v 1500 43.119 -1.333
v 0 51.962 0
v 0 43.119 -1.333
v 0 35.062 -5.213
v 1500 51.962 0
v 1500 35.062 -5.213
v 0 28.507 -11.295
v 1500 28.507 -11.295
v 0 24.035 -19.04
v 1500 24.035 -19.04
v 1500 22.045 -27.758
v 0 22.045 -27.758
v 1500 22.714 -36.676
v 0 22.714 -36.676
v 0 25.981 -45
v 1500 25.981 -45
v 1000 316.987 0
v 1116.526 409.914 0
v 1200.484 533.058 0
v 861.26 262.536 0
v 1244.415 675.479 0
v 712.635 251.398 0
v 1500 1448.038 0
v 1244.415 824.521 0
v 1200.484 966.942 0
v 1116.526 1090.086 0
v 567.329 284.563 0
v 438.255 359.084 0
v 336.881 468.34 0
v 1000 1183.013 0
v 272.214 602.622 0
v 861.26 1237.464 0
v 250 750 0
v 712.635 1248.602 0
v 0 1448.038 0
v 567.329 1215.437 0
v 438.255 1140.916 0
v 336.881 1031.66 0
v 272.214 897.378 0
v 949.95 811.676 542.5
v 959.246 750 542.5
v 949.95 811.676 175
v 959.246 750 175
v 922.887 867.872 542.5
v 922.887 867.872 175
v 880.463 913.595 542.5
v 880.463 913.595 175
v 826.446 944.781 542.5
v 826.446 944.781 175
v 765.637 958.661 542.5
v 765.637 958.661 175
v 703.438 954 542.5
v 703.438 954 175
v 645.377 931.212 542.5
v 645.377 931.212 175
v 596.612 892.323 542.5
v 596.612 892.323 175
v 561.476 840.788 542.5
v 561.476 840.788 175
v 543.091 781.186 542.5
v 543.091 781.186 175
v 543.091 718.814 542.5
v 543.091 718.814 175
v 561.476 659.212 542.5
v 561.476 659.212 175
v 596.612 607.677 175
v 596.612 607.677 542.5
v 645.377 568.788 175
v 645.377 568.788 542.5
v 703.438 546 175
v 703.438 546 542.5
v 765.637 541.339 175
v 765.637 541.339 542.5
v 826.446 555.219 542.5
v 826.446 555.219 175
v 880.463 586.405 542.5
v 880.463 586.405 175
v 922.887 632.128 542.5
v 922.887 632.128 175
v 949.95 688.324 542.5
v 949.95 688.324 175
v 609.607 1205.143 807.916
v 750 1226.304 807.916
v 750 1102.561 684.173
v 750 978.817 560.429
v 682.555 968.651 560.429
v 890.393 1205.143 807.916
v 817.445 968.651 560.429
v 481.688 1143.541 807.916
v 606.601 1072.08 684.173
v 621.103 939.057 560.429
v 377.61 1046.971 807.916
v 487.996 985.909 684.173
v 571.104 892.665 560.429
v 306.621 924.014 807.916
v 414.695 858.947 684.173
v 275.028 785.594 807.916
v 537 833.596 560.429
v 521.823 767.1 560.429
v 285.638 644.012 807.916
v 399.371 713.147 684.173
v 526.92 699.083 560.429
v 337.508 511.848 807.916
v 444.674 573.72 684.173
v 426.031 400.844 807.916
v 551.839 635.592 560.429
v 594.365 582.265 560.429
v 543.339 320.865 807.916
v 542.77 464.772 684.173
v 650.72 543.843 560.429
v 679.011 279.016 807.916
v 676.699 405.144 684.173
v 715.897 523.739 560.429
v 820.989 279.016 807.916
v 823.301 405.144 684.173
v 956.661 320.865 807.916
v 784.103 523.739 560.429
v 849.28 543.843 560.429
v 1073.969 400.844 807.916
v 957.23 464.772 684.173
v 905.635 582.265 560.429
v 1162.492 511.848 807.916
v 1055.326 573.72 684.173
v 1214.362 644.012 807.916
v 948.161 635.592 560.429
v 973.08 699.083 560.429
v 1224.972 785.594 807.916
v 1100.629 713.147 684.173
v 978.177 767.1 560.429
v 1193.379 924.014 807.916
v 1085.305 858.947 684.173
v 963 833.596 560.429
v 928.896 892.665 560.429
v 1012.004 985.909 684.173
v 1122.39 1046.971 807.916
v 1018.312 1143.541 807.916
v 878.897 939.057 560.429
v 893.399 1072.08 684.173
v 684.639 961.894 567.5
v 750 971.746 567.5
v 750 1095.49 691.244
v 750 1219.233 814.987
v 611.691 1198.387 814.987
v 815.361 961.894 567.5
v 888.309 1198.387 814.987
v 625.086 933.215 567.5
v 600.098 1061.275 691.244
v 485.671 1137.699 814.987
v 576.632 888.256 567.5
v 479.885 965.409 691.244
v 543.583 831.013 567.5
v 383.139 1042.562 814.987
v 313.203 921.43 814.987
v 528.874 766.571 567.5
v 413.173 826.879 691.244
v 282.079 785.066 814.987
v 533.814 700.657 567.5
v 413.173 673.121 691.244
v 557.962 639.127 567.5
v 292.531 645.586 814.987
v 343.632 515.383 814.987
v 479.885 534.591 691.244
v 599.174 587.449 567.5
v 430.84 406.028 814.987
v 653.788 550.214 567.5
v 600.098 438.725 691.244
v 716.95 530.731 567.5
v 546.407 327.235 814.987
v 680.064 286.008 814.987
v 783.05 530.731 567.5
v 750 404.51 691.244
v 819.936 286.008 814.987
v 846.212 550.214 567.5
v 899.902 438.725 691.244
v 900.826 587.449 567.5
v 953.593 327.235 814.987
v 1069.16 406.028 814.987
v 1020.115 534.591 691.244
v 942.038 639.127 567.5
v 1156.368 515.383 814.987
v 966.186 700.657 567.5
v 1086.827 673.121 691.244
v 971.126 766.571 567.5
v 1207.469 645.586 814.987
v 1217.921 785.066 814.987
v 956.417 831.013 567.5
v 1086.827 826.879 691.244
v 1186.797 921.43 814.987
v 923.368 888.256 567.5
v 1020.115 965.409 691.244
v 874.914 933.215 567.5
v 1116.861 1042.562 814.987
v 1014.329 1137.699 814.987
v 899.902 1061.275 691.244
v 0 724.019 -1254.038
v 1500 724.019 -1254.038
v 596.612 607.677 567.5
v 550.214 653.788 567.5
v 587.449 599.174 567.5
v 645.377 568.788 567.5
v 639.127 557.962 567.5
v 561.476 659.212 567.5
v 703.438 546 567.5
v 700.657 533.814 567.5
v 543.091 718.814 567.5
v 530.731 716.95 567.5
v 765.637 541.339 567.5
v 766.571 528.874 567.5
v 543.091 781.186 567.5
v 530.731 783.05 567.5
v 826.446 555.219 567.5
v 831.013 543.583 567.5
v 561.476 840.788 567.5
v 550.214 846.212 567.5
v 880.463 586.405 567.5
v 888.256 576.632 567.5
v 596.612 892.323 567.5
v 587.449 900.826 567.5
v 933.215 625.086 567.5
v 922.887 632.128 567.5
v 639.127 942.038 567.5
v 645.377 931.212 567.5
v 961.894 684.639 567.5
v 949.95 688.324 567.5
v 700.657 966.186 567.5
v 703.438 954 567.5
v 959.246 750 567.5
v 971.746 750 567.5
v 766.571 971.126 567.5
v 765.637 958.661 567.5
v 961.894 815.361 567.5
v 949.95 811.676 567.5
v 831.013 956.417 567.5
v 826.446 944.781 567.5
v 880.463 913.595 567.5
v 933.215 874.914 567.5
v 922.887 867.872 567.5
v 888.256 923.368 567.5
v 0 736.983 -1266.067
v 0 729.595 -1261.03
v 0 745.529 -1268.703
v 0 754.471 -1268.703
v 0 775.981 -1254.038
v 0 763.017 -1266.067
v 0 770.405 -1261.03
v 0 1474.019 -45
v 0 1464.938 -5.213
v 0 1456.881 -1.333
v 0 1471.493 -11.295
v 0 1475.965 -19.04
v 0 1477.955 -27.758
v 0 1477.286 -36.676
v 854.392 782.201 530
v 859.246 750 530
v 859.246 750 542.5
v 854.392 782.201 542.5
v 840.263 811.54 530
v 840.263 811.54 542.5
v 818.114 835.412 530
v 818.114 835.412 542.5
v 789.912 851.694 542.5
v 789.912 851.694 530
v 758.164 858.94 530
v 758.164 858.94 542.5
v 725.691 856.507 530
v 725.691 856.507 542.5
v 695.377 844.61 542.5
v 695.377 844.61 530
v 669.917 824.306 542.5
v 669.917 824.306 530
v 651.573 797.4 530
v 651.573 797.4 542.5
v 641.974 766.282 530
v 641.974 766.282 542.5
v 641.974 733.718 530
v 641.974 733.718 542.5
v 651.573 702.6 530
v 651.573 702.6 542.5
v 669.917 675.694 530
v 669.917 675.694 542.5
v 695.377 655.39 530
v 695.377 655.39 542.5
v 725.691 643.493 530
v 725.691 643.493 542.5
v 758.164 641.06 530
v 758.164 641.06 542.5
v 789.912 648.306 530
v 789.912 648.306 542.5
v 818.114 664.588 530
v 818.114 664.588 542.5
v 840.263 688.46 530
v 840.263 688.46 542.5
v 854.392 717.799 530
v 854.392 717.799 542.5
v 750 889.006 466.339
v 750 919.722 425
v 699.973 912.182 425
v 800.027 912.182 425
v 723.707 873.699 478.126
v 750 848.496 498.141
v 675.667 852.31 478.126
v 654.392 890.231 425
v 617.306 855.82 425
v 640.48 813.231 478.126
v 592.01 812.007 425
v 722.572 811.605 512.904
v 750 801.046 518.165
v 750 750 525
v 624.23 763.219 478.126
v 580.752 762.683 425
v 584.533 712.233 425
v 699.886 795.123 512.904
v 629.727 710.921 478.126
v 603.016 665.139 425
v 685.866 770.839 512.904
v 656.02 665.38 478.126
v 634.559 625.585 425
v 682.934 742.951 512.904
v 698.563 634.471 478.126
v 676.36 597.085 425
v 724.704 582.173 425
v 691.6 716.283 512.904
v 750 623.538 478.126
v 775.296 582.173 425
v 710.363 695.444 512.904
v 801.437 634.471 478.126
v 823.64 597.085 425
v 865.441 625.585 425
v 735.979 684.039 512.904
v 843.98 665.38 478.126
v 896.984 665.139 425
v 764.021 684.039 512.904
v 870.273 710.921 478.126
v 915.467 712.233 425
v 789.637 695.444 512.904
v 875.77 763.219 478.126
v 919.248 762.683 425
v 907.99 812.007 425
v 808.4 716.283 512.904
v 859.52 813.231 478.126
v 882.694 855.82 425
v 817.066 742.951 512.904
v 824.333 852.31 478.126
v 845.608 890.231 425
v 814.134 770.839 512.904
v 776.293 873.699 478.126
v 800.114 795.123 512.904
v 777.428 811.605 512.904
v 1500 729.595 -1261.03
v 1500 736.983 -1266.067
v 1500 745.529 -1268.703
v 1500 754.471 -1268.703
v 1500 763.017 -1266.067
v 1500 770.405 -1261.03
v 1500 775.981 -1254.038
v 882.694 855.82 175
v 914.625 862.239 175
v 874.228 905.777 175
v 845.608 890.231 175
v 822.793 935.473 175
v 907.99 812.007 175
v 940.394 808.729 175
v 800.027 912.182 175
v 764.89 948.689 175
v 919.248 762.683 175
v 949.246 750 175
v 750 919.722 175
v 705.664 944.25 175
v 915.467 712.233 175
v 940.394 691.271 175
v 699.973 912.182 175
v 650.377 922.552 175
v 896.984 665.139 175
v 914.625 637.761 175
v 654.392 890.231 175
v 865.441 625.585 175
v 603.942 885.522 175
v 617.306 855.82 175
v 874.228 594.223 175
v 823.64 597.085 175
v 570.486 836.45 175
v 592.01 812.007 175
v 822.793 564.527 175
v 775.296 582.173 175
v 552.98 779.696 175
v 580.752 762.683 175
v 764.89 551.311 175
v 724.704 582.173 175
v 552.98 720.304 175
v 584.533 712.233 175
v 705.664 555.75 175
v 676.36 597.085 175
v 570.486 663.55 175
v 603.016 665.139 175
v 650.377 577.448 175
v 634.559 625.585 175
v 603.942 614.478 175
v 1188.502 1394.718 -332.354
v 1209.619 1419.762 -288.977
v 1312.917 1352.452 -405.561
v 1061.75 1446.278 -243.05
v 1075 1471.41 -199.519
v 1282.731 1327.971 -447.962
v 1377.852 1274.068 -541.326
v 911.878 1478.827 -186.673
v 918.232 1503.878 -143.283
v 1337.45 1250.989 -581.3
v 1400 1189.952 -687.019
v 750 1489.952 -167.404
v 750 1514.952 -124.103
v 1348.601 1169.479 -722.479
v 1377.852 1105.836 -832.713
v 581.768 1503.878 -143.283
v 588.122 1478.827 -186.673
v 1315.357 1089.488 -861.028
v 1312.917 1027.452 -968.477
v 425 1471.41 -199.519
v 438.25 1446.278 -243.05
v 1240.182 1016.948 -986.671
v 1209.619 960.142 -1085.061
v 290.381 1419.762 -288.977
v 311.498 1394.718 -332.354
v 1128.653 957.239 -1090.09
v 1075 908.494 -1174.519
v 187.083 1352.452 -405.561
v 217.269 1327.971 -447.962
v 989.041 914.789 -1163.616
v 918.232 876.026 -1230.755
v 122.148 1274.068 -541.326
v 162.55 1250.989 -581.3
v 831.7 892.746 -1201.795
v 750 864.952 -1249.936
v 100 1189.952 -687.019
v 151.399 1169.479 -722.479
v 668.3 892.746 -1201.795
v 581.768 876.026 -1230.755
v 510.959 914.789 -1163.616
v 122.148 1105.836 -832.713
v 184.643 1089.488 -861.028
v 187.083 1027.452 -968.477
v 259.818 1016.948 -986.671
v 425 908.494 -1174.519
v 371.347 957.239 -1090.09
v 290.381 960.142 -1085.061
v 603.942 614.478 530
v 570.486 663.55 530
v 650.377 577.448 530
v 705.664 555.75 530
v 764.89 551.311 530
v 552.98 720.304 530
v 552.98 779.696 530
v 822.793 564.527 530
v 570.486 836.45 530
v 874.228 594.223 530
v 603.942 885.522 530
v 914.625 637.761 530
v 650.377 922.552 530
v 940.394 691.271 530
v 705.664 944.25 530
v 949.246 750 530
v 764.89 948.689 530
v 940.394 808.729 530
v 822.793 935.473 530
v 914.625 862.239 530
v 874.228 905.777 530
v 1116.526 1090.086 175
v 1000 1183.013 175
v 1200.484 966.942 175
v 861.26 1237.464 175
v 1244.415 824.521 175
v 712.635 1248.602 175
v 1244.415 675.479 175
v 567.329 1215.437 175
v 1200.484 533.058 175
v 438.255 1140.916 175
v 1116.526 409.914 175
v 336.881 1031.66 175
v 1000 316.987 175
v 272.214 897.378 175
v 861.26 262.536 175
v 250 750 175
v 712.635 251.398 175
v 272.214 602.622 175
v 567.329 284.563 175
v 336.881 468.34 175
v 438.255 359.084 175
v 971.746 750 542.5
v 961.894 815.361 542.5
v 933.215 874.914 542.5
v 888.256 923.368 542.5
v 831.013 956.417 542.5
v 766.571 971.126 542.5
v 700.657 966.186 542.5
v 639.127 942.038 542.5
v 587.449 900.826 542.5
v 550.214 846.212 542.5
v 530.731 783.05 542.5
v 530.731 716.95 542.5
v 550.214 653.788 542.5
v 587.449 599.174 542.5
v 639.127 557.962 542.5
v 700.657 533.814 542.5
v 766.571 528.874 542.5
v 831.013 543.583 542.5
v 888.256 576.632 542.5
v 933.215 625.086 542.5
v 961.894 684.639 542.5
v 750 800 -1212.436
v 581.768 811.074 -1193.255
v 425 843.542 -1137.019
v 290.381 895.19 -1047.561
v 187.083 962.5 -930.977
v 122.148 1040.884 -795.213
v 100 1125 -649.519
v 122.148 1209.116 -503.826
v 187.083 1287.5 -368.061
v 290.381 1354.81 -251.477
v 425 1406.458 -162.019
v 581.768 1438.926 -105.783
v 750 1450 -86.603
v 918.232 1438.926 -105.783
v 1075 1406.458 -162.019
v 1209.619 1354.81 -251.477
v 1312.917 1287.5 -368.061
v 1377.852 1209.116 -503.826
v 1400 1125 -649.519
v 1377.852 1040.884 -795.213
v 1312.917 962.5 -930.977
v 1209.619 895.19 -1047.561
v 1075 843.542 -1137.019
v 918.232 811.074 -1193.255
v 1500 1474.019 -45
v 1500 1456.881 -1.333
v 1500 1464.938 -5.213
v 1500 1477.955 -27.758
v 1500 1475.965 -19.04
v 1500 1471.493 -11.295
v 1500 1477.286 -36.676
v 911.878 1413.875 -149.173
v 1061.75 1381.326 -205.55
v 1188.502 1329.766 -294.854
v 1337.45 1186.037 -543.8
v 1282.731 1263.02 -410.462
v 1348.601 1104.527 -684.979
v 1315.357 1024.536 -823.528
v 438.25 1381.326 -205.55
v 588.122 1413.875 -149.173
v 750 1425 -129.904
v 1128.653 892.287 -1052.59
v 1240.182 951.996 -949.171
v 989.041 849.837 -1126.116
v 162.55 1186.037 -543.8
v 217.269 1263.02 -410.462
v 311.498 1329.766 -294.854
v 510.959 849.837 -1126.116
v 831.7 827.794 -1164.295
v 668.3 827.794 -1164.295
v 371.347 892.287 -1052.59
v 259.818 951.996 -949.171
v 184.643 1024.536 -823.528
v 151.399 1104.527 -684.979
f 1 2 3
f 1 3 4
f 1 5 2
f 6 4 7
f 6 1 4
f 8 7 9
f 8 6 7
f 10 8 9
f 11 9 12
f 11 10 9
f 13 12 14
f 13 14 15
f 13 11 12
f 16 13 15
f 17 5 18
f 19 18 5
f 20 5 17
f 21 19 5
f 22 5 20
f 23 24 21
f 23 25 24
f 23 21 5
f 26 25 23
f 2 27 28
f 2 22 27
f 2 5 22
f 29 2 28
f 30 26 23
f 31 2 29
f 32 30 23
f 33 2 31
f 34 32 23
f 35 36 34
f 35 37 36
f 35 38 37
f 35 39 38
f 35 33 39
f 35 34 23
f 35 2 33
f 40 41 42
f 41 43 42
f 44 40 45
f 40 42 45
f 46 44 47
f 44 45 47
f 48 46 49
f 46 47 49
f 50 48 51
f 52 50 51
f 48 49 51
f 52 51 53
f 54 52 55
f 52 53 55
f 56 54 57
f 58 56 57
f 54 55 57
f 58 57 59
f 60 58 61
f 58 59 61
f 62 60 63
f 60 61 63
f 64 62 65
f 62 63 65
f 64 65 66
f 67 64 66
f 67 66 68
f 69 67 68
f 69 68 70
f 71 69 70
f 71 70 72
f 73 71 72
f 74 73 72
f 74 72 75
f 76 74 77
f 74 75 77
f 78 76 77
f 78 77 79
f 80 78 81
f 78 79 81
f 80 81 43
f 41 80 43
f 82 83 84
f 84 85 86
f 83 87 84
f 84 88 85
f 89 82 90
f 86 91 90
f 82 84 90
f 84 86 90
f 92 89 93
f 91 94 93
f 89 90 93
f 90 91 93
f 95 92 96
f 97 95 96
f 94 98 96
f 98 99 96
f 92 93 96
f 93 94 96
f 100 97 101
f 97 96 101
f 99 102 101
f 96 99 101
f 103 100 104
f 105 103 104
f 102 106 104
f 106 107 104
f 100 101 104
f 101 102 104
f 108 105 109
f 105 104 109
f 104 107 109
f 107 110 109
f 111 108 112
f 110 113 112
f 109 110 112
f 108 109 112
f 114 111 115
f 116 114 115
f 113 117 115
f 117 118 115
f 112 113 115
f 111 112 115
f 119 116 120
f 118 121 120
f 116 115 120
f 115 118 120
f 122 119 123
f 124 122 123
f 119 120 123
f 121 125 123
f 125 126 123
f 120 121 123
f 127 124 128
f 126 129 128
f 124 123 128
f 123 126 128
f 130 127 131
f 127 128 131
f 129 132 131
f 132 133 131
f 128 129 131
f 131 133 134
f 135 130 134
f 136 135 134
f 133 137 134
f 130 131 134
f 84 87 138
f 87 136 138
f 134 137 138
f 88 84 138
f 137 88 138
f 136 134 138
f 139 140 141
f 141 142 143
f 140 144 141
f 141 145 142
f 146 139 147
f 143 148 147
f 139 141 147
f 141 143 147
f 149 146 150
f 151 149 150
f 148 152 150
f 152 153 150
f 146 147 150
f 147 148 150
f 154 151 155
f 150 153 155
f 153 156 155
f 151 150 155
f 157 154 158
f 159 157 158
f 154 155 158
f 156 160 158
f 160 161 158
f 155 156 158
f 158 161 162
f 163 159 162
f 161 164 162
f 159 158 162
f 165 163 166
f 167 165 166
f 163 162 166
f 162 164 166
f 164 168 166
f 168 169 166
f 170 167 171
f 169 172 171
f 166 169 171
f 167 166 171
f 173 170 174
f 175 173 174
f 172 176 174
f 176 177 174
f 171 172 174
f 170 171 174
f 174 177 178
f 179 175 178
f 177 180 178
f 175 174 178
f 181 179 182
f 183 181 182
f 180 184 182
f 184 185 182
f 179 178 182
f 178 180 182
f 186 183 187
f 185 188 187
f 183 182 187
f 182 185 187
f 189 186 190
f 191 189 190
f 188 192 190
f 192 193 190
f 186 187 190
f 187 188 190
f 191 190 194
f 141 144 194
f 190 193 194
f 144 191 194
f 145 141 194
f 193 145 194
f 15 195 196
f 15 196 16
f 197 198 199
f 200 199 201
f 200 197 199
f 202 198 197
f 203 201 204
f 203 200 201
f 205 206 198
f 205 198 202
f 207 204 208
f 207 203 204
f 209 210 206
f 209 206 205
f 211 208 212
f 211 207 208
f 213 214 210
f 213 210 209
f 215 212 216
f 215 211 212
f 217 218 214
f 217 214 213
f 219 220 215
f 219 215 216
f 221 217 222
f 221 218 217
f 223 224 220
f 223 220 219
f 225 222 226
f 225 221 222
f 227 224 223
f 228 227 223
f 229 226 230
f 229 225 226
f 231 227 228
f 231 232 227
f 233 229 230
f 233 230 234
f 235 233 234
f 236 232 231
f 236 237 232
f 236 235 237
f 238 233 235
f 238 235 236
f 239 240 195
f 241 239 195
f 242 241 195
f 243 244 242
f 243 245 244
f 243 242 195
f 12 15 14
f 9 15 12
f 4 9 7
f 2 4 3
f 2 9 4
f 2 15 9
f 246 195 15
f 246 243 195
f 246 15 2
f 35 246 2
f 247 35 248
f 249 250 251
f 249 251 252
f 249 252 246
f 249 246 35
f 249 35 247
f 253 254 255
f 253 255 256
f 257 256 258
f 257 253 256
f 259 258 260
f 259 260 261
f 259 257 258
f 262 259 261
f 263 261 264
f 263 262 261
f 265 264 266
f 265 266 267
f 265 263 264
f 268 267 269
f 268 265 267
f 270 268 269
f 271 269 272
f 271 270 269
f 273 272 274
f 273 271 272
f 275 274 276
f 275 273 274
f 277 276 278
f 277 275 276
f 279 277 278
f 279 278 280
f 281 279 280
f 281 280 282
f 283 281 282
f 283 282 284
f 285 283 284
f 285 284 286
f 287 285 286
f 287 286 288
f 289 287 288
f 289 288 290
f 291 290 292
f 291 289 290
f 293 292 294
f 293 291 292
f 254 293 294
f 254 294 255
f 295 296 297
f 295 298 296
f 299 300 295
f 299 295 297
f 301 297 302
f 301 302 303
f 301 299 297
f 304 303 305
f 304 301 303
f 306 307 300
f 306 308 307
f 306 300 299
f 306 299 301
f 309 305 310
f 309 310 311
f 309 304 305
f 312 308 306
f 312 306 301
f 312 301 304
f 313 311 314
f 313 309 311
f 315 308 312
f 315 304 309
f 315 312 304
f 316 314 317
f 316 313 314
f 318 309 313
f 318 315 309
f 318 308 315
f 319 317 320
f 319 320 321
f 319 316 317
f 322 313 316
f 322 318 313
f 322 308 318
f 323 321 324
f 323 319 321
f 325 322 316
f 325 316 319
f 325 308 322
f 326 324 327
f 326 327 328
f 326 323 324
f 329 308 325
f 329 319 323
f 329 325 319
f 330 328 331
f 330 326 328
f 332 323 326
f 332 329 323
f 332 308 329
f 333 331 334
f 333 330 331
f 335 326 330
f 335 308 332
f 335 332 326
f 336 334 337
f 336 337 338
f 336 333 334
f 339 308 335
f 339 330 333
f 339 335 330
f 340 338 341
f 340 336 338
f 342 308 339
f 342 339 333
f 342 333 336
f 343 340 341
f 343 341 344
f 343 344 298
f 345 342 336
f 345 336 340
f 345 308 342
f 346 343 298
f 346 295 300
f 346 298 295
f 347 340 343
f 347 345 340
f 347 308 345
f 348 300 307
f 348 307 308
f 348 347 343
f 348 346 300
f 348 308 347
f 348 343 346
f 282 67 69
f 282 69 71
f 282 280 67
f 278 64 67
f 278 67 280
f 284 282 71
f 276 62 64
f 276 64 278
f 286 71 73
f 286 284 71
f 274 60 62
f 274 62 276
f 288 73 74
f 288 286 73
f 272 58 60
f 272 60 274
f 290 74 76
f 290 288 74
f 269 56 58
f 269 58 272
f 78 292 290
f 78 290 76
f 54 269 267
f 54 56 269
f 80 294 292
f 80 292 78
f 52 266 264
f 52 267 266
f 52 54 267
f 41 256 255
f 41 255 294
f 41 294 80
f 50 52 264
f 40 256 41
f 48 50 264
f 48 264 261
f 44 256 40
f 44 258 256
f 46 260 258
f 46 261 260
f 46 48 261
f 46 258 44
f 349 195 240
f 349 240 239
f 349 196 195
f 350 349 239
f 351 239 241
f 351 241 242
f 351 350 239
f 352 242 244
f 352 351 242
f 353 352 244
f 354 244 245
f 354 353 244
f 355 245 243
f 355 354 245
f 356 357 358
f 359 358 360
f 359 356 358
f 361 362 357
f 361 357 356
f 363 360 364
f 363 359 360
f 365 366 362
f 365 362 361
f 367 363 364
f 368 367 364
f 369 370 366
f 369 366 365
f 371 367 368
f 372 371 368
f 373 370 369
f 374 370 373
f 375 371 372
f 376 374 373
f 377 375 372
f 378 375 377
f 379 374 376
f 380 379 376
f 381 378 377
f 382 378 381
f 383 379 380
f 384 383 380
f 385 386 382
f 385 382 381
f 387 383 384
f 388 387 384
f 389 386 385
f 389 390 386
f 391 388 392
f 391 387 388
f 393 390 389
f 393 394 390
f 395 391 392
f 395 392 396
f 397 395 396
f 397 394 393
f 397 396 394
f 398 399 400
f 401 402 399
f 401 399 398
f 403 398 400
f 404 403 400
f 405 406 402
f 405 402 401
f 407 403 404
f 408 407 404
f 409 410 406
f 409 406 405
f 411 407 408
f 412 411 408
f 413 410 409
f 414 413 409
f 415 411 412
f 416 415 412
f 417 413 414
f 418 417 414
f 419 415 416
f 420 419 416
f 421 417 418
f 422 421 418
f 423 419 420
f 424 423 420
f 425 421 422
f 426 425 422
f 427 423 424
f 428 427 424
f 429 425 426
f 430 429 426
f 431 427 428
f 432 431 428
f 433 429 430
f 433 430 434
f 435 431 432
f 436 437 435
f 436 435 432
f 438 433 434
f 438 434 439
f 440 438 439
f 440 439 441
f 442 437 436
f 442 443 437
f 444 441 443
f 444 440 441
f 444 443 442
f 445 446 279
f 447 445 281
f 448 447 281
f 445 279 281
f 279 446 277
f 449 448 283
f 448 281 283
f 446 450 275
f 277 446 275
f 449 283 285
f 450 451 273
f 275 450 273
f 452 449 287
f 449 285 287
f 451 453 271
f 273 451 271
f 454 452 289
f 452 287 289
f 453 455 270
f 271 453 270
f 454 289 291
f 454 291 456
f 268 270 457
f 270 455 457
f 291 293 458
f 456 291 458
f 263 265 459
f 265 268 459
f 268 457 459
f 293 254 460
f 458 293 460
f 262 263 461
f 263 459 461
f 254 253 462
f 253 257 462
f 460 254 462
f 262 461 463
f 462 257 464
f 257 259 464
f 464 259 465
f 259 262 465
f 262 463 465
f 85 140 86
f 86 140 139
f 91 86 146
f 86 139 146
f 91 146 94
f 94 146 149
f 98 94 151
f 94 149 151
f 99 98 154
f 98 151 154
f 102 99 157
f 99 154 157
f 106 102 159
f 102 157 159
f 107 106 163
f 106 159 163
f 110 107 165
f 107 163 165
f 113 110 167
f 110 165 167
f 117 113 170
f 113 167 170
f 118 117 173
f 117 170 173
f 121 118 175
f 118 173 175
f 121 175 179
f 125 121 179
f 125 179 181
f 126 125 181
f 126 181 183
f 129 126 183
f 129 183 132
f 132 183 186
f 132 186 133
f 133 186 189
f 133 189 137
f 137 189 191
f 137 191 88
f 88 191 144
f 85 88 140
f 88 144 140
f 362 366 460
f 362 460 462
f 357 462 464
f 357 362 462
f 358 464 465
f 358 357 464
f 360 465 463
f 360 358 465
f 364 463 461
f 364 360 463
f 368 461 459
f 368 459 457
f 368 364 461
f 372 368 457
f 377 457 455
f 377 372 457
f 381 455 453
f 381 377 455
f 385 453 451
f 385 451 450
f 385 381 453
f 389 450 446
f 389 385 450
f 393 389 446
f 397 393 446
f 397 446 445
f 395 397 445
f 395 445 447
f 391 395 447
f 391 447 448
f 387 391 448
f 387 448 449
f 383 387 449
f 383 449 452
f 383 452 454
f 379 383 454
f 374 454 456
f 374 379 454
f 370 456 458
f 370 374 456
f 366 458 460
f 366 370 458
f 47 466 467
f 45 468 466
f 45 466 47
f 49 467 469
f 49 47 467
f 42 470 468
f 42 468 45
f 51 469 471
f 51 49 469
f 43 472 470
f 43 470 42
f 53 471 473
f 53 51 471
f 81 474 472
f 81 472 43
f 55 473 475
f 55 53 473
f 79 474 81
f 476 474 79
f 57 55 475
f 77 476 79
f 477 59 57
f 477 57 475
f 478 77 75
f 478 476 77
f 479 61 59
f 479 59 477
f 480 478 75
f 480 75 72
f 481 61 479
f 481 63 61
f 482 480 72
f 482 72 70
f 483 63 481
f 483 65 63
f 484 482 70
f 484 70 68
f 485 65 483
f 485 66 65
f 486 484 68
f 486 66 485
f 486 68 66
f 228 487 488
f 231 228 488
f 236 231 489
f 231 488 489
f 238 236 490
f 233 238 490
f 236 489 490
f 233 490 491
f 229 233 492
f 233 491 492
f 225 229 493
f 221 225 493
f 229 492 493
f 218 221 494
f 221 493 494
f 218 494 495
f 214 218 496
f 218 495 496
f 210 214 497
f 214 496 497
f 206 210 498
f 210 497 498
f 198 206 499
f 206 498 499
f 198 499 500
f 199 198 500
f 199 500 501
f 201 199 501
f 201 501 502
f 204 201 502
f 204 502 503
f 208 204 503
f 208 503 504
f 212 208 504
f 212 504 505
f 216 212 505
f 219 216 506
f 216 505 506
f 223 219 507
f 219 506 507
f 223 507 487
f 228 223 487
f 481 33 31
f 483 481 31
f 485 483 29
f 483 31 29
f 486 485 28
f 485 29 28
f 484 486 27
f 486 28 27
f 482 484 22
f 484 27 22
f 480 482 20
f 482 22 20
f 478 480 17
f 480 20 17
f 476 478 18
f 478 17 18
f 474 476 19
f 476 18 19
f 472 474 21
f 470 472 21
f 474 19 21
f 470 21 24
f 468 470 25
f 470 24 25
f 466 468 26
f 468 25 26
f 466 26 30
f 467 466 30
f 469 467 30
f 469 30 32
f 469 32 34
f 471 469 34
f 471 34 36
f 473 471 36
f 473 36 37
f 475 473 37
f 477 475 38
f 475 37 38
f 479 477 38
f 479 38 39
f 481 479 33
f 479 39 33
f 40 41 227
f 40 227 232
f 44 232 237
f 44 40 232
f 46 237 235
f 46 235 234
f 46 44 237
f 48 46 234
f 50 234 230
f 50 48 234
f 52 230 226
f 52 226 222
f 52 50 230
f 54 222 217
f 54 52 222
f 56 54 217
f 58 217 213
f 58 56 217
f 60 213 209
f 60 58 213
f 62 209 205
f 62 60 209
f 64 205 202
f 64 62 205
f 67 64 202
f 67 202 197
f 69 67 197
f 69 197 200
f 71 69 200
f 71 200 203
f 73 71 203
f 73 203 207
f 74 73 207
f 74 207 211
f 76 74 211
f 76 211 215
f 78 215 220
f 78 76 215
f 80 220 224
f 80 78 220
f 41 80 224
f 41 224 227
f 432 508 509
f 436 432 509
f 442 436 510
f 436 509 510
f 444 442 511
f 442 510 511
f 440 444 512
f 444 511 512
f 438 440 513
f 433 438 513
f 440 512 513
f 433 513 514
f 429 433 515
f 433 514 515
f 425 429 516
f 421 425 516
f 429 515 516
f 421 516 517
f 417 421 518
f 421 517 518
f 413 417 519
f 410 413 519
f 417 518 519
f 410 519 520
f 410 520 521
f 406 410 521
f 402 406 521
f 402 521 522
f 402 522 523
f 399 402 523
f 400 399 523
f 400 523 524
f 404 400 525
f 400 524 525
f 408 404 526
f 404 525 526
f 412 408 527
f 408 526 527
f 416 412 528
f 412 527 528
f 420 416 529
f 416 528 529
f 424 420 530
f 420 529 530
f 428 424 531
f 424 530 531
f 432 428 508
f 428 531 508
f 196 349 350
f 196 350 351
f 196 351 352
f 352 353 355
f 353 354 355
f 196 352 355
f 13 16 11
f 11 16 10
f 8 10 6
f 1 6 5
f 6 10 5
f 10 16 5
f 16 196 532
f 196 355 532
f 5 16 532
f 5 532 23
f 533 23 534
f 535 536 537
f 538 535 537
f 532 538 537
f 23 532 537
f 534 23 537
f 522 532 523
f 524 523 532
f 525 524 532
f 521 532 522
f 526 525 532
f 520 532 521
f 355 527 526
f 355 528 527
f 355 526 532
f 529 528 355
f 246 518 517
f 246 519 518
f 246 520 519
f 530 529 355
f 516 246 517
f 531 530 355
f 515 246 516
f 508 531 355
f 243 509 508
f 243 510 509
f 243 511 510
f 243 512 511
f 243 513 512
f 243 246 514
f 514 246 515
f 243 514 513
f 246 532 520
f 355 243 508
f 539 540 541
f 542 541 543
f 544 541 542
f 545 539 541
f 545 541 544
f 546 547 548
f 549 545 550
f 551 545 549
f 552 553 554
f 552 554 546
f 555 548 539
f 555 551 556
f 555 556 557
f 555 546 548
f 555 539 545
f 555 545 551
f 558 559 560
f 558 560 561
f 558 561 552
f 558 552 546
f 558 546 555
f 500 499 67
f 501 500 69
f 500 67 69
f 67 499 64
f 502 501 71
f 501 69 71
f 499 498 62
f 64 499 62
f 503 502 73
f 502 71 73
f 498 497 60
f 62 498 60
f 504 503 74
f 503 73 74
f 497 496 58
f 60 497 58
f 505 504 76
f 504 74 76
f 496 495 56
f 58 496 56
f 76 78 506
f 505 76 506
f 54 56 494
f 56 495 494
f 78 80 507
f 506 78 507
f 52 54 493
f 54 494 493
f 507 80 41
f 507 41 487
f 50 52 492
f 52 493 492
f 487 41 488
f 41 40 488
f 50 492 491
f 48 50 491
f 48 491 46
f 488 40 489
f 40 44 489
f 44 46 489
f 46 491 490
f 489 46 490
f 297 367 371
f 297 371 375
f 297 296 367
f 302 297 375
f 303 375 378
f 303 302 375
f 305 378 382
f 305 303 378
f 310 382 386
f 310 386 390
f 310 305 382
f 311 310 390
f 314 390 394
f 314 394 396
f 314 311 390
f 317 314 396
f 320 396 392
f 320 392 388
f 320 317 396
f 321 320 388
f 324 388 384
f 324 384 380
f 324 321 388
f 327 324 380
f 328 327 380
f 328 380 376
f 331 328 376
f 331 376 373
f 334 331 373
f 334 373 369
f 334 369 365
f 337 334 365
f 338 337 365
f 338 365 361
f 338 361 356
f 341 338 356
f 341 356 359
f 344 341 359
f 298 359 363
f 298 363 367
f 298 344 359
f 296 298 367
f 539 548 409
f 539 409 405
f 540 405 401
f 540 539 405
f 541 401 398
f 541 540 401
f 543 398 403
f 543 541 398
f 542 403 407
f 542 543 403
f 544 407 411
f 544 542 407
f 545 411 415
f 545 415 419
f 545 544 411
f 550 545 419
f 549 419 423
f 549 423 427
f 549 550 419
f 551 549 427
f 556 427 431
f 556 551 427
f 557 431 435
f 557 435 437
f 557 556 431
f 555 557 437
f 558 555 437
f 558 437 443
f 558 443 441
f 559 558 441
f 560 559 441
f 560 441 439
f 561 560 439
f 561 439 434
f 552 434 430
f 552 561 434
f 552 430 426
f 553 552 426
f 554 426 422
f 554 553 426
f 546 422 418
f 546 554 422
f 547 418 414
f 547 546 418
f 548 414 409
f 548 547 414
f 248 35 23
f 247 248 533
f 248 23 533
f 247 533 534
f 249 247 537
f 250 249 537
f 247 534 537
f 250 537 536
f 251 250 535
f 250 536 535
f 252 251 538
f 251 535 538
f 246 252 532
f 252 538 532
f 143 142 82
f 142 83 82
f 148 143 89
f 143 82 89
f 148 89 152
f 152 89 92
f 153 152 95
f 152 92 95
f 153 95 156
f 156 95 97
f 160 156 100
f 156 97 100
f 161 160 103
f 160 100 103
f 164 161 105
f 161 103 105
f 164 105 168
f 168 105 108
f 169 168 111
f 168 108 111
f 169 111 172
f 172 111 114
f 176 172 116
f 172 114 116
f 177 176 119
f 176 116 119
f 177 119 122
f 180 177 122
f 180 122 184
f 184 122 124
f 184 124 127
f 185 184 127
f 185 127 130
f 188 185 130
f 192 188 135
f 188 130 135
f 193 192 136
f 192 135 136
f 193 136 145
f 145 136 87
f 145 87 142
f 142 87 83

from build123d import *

# Parameters (mm, degrees)
BOSS_EXTRUDE1_DEPTH = 1500
FILLET5_R           = 30
FILLET6_R           = 30
SKETCH5_R           = 500
BOSS_EXTRUDE2_DEPTH = 175
SKETCH10_R          = 209.245879224
SKETCH10_R_2        = 199.245879224
EXTRUDE_THIN2_DEPTH = 355
SKETCH11_R          = 209.245879224
SKETCH11_R_2        = 109.245879224
BOSS_EXTRUDE3_DEPTH = 12.5
SKETCH12_R          = 221.745879224
SKETCH12_R_2        = 209.245879224
BOSS_EXTRUDE5_DEPTH = 25
SKETCH15_R          = 650
SKETCH15_R_2        = 600
BOSS_EXTRUDE6_DEPTH = 75


with BuildPart() as part:
    # Sketch3 → Boss-Extrude1 (new body)
    with BuildSketch(Plane(origin=(0, 0, 0), x_dir=(0, 0, -1), z_dir=(1, 0, 0))):
        Polygon((0, 0), (0, 1500), (1299.038105677, 750), align=None)
    extrude(amount=BOSS_EXTRUDE1_DEPTH)

    # Fillet5
    fillet5_edges = [part.edges().sort_by_distance(p)[0] for p in [
        (750, 1500, 0),
    ]]
    fillet(fillet5_edges, radius=FILLET5_R)

    # Fillet6
    fillet6_edges = [part.edges().sort_by_distance(p)[0] for p in [
        (750, 0, 0),
        (750, 750, -1299.038105677),
    ]]
    fillet(fillet6_edges, radius=FILLET6_R)

    # Sketch5 → Boss-Extrude2 (add)
    with BuildSketch(Plane.XY):
        with Locations(Location((750, 750, 0), (0, 0, 180))):
            Circle(SKETCH5_R)
    extrude(amount=BOSS_EXTRUDE2_DEPTH)

    # Sketch9 → Revolve1 (revolve)
    with BuildSketch(Plane(origin=(750, 0, 0), x_dir=(0, 0, -1), z_dir=(1, 0, 0))):
        with BuildLine():
            Line((-175, 919.722447551), (-425, 919.722447551))
            ThreePointArc((-425, 919.722447551), (-498.140976829, 848.495823773), (-525, 750))
            Line((-525, 750), (-175, 750))
            Line((-175, 750), (-175, 919.722447551))
        make_face()
    revolve(axis=Axis((750, 750, 175), (0, 0, 1)))

    # Sketch10 → Extrude-Thin2 (add)
    with BuildSketch(Plane.XY.offset(175)):
        with Locations((750, 750)):
            Circle(SKETCH10_R)
        with Locations((750, 750)):
            Circle(SKETCH10_R_2, mode=Mode.SUBTRACT)
    extrude(amount=EXTRUDE_THIN2_DEPTH)

    # Sketch11 → Boss-Extrude3 (add)
    with BuildSketch(Plane.XY.offset(530)):
        with Locations((750, 750)):
            Circle(SKETCH11_R)
        with Locations((750, 750)):
            Circle(SKETCH11_R_2, mode=Mode.SUBTRACT)
    extrude(amount=BOSS_EXTRUDE3_DEPTH)

    # Sketch15 → Boss-Extrude6 (add)
    with BuildSketch(Plane(origin=(0, 1125, -649.519052838), x_dir=(1, 0, 0), z_dir=(0, 0.8660254037844382, -0.500000000000001))):
        with Locations(Location((750, 0, 0), (0, 0, 90))):
            Circle(SKETCH15_R)
        with Locations(Location((750, 0, 0), (0, 0, 270))):
            Circle(SKETCH15_R_2, mode=Mode.SUBTRACT)
    extrude(amount=BOSS_EXTRUDE6_DEPTH)


with BuildPart() as body_2:
    # Sketch12 → Boss-Extrude5 (new body)
    with BuildSketch(Plane.XY.offset(542.5)):
        with Locations((750, 750)):
            Circle(SKETCH12_R)
        with Locations((750, 750)):
            Circle(SKETCH12_R_2, mode=Mode.SUBTRACT)
    extrude(amount=BOSS_EXTRUDE5_DEPTH)


with BuildPart() as body_3:
    # Sketch13 → Revolve-Thin1 (revolve)
    with BuildSketch(Plane(origin=(750, 0, 0), x_dir=(0, 0, -1), z_dir=(1, 0, 0))):
        Polygon((-567.5, 971.745879224), (-814.987373415, 1219.233252639), (-807.916305603, 1226.304320451), (-560.428932188, 978.816947036), align=None)
    revolve(axis=Axis((750, 750, -1269.038105677), (0, 0, 1)))


solid = Compound([part.part, body_2.part, body_3.part])
